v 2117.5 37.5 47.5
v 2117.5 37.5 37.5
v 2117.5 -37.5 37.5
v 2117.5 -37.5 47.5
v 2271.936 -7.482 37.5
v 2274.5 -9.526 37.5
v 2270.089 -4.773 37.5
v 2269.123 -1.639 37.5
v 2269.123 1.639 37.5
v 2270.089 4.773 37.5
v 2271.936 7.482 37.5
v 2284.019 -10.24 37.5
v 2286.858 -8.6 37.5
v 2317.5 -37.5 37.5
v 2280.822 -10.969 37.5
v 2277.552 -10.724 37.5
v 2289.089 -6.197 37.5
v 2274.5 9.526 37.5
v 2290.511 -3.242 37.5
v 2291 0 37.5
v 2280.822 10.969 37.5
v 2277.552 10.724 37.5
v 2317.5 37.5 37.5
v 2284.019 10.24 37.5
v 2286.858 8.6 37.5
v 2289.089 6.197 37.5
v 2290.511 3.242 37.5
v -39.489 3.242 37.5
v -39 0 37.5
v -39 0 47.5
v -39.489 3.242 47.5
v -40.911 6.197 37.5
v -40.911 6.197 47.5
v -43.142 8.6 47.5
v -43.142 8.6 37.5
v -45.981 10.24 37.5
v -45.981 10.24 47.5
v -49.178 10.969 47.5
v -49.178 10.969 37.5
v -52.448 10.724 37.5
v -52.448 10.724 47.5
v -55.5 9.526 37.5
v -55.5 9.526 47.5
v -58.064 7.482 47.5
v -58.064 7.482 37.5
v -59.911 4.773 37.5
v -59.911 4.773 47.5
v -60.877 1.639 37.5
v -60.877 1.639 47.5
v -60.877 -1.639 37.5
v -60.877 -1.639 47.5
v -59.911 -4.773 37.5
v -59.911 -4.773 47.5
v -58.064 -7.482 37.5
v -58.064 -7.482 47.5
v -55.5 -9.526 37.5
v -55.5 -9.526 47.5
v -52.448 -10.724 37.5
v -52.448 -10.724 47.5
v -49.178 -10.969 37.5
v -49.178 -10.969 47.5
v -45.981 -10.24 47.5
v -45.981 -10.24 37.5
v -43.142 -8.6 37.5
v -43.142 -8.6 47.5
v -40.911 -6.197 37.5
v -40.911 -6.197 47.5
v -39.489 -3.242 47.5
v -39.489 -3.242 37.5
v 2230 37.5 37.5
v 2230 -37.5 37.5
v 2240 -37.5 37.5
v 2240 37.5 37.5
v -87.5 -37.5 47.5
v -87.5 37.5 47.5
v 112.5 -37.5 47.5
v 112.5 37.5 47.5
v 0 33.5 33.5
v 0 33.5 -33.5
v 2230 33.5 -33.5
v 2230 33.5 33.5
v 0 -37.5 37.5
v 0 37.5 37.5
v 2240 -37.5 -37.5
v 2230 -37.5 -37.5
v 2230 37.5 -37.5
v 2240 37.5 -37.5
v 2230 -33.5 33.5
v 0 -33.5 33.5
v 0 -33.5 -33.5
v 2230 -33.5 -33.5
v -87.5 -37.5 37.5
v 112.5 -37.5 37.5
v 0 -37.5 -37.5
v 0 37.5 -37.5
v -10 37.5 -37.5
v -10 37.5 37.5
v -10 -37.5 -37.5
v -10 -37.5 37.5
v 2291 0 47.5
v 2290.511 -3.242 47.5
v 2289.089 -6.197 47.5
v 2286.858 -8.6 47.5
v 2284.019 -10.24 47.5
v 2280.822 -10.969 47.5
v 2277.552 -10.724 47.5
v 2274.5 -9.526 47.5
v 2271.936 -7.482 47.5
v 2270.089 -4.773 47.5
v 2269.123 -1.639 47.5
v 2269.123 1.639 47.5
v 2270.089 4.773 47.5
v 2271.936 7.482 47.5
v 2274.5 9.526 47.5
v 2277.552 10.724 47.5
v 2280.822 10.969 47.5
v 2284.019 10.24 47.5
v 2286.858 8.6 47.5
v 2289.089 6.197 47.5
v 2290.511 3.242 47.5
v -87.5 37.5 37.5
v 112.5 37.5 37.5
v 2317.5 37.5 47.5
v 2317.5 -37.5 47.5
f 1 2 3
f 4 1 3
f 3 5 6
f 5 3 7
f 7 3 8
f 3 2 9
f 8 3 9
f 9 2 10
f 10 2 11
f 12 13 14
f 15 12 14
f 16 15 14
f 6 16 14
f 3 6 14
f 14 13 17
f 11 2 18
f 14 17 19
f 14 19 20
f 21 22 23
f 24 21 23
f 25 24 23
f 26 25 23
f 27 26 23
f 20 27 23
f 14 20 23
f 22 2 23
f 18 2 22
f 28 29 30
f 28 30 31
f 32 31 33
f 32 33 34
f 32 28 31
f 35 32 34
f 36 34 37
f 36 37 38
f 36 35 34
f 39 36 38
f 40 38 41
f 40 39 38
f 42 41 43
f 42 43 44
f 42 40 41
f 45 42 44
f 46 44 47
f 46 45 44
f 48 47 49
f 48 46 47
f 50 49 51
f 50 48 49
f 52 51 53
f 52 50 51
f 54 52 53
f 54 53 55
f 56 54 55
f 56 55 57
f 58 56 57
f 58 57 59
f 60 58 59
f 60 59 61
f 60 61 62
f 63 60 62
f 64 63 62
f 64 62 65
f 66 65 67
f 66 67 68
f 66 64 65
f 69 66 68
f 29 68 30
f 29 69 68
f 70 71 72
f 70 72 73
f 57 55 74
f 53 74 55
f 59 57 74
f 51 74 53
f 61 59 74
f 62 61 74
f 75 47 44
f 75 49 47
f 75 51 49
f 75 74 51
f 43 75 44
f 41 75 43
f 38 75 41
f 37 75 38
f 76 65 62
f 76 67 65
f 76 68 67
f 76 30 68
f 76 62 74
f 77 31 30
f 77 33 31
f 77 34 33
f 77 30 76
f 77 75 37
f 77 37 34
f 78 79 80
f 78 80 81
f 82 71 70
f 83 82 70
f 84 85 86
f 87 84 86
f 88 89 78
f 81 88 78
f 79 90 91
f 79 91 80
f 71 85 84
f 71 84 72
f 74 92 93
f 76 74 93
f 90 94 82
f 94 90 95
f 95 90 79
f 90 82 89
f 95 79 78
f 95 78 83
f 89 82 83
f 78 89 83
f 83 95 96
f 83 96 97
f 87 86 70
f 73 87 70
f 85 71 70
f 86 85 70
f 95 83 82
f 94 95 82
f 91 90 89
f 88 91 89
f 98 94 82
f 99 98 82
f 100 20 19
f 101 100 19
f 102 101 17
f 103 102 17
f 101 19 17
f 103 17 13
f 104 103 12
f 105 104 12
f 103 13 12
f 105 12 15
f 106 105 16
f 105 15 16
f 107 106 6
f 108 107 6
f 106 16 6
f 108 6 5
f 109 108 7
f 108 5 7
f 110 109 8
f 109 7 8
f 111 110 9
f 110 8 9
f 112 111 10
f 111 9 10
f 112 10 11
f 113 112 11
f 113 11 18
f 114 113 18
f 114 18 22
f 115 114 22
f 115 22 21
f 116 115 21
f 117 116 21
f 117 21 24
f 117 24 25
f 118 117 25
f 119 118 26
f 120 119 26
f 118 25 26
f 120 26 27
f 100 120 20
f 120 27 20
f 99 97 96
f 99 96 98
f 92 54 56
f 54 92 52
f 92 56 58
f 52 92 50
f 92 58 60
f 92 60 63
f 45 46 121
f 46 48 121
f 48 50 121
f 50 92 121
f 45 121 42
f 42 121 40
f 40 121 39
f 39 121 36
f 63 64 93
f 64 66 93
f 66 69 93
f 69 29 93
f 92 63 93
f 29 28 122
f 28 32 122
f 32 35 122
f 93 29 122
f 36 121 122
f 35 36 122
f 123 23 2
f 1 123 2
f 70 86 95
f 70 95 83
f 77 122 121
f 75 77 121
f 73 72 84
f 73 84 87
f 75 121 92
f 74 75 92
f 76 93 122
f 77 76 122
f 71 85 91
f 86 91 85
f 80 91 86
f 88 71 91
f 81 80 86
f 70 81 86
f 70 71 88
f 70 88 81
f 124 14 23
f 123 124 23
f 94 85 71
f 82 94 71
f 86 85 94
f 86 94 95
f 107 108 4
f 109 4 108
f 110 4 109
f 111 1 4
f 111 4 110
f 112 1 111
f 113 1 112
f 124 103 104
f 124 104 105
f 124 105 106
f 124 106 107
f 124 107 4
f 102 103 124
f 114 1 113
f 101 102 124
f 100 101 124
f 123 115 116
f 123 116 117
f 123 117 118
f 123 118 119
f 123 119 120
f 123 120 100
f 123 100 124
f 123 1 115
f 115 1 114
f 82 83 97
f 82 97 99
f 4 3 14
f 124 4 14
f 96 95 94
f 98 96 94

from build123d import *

# Parameters (mm, degrees)
F0_W     = 75
F0_H     = 75
F0_W_2   = 67
F0_H_2   = 67
F1_DEPTH = 2230
F2_W     = 75
F2_H     = 75
F3_DEPTH = 10
F4_W     = 75
F4_H     = 75
F5_DEPTH = 10
F6_R     = 11
F7_DEPTH = 10
F9_DEPTH = 10


with BuildPart() as f1:
    # F0 (on Right) → F1 (new body)
    with BuildSketch(Plane.YZ):
        Rectangle(F0_W, F0_H)
        Rectangle(F0_W_2, F0_H_2, mode=Mode.SUBTRACT)
    extrude(amount=F1_DEPTH)


with BuildPart() as f3:
    # F2 (on face) → F3 (new body)
    with BuildSketch(Plane.YZ.offset(2230)):
        Rectangle(F2_W, F2_H)
    extrude(amount=F3_DEPTH)


with BuildPart() as f5:
    # F4 (on face) → F5 (new body)
    with BuildSketch(Plane(origin=(0, 0, 0), x_dir=(0, -1, 0), z_dir=(-1, 0, 0))):
        Rectangle(F4_W, F4_H)
    extrude(amount=F5_DEPTH)


with BuildPart() as f7:
    # F6 (on face) → F7 (new body)
    with BuildSketch(Plane.XY.offset(37.5)):
        Polygon((0, -37.5), (0, 0), (0, 37.5), (-87.5, 37.5), (-87.5, -37.5), align=None)
        with Locations((-50, 0)):
            Circle(F6_R, mode=Mode.SUBTRACT)
        Polygon((0, 37.5), (0, 0), (0, -37.5), (112.5, -37.5), (112.5, 37.5), align=None)
    extrude(amount=F7_DEPTH)


with BuildPart() as f9:
    # F8 (on face) → F9 (new body)
    with BuildSketch(Plane.XY.offset(37.5)):
        Polygon((2117.5, -37.5), (2230, -37.5), (2317.5, -37.5), (2317.5, 37.5), (2117.5, 37.5), align=None)
        with BuildLine():
            ThreePointArc((2269, 0), (2280, 11), (2291, 0))
            ThreePointArc((2291, 0), (2280, -11), (2269, 0))
        make_face(mode=Mode.SUBTRACT)
    extrude(amount=F9_DEPTH)


solid = Compound([f1.part, f3.part, f5.part, f7.part, f9.part])
